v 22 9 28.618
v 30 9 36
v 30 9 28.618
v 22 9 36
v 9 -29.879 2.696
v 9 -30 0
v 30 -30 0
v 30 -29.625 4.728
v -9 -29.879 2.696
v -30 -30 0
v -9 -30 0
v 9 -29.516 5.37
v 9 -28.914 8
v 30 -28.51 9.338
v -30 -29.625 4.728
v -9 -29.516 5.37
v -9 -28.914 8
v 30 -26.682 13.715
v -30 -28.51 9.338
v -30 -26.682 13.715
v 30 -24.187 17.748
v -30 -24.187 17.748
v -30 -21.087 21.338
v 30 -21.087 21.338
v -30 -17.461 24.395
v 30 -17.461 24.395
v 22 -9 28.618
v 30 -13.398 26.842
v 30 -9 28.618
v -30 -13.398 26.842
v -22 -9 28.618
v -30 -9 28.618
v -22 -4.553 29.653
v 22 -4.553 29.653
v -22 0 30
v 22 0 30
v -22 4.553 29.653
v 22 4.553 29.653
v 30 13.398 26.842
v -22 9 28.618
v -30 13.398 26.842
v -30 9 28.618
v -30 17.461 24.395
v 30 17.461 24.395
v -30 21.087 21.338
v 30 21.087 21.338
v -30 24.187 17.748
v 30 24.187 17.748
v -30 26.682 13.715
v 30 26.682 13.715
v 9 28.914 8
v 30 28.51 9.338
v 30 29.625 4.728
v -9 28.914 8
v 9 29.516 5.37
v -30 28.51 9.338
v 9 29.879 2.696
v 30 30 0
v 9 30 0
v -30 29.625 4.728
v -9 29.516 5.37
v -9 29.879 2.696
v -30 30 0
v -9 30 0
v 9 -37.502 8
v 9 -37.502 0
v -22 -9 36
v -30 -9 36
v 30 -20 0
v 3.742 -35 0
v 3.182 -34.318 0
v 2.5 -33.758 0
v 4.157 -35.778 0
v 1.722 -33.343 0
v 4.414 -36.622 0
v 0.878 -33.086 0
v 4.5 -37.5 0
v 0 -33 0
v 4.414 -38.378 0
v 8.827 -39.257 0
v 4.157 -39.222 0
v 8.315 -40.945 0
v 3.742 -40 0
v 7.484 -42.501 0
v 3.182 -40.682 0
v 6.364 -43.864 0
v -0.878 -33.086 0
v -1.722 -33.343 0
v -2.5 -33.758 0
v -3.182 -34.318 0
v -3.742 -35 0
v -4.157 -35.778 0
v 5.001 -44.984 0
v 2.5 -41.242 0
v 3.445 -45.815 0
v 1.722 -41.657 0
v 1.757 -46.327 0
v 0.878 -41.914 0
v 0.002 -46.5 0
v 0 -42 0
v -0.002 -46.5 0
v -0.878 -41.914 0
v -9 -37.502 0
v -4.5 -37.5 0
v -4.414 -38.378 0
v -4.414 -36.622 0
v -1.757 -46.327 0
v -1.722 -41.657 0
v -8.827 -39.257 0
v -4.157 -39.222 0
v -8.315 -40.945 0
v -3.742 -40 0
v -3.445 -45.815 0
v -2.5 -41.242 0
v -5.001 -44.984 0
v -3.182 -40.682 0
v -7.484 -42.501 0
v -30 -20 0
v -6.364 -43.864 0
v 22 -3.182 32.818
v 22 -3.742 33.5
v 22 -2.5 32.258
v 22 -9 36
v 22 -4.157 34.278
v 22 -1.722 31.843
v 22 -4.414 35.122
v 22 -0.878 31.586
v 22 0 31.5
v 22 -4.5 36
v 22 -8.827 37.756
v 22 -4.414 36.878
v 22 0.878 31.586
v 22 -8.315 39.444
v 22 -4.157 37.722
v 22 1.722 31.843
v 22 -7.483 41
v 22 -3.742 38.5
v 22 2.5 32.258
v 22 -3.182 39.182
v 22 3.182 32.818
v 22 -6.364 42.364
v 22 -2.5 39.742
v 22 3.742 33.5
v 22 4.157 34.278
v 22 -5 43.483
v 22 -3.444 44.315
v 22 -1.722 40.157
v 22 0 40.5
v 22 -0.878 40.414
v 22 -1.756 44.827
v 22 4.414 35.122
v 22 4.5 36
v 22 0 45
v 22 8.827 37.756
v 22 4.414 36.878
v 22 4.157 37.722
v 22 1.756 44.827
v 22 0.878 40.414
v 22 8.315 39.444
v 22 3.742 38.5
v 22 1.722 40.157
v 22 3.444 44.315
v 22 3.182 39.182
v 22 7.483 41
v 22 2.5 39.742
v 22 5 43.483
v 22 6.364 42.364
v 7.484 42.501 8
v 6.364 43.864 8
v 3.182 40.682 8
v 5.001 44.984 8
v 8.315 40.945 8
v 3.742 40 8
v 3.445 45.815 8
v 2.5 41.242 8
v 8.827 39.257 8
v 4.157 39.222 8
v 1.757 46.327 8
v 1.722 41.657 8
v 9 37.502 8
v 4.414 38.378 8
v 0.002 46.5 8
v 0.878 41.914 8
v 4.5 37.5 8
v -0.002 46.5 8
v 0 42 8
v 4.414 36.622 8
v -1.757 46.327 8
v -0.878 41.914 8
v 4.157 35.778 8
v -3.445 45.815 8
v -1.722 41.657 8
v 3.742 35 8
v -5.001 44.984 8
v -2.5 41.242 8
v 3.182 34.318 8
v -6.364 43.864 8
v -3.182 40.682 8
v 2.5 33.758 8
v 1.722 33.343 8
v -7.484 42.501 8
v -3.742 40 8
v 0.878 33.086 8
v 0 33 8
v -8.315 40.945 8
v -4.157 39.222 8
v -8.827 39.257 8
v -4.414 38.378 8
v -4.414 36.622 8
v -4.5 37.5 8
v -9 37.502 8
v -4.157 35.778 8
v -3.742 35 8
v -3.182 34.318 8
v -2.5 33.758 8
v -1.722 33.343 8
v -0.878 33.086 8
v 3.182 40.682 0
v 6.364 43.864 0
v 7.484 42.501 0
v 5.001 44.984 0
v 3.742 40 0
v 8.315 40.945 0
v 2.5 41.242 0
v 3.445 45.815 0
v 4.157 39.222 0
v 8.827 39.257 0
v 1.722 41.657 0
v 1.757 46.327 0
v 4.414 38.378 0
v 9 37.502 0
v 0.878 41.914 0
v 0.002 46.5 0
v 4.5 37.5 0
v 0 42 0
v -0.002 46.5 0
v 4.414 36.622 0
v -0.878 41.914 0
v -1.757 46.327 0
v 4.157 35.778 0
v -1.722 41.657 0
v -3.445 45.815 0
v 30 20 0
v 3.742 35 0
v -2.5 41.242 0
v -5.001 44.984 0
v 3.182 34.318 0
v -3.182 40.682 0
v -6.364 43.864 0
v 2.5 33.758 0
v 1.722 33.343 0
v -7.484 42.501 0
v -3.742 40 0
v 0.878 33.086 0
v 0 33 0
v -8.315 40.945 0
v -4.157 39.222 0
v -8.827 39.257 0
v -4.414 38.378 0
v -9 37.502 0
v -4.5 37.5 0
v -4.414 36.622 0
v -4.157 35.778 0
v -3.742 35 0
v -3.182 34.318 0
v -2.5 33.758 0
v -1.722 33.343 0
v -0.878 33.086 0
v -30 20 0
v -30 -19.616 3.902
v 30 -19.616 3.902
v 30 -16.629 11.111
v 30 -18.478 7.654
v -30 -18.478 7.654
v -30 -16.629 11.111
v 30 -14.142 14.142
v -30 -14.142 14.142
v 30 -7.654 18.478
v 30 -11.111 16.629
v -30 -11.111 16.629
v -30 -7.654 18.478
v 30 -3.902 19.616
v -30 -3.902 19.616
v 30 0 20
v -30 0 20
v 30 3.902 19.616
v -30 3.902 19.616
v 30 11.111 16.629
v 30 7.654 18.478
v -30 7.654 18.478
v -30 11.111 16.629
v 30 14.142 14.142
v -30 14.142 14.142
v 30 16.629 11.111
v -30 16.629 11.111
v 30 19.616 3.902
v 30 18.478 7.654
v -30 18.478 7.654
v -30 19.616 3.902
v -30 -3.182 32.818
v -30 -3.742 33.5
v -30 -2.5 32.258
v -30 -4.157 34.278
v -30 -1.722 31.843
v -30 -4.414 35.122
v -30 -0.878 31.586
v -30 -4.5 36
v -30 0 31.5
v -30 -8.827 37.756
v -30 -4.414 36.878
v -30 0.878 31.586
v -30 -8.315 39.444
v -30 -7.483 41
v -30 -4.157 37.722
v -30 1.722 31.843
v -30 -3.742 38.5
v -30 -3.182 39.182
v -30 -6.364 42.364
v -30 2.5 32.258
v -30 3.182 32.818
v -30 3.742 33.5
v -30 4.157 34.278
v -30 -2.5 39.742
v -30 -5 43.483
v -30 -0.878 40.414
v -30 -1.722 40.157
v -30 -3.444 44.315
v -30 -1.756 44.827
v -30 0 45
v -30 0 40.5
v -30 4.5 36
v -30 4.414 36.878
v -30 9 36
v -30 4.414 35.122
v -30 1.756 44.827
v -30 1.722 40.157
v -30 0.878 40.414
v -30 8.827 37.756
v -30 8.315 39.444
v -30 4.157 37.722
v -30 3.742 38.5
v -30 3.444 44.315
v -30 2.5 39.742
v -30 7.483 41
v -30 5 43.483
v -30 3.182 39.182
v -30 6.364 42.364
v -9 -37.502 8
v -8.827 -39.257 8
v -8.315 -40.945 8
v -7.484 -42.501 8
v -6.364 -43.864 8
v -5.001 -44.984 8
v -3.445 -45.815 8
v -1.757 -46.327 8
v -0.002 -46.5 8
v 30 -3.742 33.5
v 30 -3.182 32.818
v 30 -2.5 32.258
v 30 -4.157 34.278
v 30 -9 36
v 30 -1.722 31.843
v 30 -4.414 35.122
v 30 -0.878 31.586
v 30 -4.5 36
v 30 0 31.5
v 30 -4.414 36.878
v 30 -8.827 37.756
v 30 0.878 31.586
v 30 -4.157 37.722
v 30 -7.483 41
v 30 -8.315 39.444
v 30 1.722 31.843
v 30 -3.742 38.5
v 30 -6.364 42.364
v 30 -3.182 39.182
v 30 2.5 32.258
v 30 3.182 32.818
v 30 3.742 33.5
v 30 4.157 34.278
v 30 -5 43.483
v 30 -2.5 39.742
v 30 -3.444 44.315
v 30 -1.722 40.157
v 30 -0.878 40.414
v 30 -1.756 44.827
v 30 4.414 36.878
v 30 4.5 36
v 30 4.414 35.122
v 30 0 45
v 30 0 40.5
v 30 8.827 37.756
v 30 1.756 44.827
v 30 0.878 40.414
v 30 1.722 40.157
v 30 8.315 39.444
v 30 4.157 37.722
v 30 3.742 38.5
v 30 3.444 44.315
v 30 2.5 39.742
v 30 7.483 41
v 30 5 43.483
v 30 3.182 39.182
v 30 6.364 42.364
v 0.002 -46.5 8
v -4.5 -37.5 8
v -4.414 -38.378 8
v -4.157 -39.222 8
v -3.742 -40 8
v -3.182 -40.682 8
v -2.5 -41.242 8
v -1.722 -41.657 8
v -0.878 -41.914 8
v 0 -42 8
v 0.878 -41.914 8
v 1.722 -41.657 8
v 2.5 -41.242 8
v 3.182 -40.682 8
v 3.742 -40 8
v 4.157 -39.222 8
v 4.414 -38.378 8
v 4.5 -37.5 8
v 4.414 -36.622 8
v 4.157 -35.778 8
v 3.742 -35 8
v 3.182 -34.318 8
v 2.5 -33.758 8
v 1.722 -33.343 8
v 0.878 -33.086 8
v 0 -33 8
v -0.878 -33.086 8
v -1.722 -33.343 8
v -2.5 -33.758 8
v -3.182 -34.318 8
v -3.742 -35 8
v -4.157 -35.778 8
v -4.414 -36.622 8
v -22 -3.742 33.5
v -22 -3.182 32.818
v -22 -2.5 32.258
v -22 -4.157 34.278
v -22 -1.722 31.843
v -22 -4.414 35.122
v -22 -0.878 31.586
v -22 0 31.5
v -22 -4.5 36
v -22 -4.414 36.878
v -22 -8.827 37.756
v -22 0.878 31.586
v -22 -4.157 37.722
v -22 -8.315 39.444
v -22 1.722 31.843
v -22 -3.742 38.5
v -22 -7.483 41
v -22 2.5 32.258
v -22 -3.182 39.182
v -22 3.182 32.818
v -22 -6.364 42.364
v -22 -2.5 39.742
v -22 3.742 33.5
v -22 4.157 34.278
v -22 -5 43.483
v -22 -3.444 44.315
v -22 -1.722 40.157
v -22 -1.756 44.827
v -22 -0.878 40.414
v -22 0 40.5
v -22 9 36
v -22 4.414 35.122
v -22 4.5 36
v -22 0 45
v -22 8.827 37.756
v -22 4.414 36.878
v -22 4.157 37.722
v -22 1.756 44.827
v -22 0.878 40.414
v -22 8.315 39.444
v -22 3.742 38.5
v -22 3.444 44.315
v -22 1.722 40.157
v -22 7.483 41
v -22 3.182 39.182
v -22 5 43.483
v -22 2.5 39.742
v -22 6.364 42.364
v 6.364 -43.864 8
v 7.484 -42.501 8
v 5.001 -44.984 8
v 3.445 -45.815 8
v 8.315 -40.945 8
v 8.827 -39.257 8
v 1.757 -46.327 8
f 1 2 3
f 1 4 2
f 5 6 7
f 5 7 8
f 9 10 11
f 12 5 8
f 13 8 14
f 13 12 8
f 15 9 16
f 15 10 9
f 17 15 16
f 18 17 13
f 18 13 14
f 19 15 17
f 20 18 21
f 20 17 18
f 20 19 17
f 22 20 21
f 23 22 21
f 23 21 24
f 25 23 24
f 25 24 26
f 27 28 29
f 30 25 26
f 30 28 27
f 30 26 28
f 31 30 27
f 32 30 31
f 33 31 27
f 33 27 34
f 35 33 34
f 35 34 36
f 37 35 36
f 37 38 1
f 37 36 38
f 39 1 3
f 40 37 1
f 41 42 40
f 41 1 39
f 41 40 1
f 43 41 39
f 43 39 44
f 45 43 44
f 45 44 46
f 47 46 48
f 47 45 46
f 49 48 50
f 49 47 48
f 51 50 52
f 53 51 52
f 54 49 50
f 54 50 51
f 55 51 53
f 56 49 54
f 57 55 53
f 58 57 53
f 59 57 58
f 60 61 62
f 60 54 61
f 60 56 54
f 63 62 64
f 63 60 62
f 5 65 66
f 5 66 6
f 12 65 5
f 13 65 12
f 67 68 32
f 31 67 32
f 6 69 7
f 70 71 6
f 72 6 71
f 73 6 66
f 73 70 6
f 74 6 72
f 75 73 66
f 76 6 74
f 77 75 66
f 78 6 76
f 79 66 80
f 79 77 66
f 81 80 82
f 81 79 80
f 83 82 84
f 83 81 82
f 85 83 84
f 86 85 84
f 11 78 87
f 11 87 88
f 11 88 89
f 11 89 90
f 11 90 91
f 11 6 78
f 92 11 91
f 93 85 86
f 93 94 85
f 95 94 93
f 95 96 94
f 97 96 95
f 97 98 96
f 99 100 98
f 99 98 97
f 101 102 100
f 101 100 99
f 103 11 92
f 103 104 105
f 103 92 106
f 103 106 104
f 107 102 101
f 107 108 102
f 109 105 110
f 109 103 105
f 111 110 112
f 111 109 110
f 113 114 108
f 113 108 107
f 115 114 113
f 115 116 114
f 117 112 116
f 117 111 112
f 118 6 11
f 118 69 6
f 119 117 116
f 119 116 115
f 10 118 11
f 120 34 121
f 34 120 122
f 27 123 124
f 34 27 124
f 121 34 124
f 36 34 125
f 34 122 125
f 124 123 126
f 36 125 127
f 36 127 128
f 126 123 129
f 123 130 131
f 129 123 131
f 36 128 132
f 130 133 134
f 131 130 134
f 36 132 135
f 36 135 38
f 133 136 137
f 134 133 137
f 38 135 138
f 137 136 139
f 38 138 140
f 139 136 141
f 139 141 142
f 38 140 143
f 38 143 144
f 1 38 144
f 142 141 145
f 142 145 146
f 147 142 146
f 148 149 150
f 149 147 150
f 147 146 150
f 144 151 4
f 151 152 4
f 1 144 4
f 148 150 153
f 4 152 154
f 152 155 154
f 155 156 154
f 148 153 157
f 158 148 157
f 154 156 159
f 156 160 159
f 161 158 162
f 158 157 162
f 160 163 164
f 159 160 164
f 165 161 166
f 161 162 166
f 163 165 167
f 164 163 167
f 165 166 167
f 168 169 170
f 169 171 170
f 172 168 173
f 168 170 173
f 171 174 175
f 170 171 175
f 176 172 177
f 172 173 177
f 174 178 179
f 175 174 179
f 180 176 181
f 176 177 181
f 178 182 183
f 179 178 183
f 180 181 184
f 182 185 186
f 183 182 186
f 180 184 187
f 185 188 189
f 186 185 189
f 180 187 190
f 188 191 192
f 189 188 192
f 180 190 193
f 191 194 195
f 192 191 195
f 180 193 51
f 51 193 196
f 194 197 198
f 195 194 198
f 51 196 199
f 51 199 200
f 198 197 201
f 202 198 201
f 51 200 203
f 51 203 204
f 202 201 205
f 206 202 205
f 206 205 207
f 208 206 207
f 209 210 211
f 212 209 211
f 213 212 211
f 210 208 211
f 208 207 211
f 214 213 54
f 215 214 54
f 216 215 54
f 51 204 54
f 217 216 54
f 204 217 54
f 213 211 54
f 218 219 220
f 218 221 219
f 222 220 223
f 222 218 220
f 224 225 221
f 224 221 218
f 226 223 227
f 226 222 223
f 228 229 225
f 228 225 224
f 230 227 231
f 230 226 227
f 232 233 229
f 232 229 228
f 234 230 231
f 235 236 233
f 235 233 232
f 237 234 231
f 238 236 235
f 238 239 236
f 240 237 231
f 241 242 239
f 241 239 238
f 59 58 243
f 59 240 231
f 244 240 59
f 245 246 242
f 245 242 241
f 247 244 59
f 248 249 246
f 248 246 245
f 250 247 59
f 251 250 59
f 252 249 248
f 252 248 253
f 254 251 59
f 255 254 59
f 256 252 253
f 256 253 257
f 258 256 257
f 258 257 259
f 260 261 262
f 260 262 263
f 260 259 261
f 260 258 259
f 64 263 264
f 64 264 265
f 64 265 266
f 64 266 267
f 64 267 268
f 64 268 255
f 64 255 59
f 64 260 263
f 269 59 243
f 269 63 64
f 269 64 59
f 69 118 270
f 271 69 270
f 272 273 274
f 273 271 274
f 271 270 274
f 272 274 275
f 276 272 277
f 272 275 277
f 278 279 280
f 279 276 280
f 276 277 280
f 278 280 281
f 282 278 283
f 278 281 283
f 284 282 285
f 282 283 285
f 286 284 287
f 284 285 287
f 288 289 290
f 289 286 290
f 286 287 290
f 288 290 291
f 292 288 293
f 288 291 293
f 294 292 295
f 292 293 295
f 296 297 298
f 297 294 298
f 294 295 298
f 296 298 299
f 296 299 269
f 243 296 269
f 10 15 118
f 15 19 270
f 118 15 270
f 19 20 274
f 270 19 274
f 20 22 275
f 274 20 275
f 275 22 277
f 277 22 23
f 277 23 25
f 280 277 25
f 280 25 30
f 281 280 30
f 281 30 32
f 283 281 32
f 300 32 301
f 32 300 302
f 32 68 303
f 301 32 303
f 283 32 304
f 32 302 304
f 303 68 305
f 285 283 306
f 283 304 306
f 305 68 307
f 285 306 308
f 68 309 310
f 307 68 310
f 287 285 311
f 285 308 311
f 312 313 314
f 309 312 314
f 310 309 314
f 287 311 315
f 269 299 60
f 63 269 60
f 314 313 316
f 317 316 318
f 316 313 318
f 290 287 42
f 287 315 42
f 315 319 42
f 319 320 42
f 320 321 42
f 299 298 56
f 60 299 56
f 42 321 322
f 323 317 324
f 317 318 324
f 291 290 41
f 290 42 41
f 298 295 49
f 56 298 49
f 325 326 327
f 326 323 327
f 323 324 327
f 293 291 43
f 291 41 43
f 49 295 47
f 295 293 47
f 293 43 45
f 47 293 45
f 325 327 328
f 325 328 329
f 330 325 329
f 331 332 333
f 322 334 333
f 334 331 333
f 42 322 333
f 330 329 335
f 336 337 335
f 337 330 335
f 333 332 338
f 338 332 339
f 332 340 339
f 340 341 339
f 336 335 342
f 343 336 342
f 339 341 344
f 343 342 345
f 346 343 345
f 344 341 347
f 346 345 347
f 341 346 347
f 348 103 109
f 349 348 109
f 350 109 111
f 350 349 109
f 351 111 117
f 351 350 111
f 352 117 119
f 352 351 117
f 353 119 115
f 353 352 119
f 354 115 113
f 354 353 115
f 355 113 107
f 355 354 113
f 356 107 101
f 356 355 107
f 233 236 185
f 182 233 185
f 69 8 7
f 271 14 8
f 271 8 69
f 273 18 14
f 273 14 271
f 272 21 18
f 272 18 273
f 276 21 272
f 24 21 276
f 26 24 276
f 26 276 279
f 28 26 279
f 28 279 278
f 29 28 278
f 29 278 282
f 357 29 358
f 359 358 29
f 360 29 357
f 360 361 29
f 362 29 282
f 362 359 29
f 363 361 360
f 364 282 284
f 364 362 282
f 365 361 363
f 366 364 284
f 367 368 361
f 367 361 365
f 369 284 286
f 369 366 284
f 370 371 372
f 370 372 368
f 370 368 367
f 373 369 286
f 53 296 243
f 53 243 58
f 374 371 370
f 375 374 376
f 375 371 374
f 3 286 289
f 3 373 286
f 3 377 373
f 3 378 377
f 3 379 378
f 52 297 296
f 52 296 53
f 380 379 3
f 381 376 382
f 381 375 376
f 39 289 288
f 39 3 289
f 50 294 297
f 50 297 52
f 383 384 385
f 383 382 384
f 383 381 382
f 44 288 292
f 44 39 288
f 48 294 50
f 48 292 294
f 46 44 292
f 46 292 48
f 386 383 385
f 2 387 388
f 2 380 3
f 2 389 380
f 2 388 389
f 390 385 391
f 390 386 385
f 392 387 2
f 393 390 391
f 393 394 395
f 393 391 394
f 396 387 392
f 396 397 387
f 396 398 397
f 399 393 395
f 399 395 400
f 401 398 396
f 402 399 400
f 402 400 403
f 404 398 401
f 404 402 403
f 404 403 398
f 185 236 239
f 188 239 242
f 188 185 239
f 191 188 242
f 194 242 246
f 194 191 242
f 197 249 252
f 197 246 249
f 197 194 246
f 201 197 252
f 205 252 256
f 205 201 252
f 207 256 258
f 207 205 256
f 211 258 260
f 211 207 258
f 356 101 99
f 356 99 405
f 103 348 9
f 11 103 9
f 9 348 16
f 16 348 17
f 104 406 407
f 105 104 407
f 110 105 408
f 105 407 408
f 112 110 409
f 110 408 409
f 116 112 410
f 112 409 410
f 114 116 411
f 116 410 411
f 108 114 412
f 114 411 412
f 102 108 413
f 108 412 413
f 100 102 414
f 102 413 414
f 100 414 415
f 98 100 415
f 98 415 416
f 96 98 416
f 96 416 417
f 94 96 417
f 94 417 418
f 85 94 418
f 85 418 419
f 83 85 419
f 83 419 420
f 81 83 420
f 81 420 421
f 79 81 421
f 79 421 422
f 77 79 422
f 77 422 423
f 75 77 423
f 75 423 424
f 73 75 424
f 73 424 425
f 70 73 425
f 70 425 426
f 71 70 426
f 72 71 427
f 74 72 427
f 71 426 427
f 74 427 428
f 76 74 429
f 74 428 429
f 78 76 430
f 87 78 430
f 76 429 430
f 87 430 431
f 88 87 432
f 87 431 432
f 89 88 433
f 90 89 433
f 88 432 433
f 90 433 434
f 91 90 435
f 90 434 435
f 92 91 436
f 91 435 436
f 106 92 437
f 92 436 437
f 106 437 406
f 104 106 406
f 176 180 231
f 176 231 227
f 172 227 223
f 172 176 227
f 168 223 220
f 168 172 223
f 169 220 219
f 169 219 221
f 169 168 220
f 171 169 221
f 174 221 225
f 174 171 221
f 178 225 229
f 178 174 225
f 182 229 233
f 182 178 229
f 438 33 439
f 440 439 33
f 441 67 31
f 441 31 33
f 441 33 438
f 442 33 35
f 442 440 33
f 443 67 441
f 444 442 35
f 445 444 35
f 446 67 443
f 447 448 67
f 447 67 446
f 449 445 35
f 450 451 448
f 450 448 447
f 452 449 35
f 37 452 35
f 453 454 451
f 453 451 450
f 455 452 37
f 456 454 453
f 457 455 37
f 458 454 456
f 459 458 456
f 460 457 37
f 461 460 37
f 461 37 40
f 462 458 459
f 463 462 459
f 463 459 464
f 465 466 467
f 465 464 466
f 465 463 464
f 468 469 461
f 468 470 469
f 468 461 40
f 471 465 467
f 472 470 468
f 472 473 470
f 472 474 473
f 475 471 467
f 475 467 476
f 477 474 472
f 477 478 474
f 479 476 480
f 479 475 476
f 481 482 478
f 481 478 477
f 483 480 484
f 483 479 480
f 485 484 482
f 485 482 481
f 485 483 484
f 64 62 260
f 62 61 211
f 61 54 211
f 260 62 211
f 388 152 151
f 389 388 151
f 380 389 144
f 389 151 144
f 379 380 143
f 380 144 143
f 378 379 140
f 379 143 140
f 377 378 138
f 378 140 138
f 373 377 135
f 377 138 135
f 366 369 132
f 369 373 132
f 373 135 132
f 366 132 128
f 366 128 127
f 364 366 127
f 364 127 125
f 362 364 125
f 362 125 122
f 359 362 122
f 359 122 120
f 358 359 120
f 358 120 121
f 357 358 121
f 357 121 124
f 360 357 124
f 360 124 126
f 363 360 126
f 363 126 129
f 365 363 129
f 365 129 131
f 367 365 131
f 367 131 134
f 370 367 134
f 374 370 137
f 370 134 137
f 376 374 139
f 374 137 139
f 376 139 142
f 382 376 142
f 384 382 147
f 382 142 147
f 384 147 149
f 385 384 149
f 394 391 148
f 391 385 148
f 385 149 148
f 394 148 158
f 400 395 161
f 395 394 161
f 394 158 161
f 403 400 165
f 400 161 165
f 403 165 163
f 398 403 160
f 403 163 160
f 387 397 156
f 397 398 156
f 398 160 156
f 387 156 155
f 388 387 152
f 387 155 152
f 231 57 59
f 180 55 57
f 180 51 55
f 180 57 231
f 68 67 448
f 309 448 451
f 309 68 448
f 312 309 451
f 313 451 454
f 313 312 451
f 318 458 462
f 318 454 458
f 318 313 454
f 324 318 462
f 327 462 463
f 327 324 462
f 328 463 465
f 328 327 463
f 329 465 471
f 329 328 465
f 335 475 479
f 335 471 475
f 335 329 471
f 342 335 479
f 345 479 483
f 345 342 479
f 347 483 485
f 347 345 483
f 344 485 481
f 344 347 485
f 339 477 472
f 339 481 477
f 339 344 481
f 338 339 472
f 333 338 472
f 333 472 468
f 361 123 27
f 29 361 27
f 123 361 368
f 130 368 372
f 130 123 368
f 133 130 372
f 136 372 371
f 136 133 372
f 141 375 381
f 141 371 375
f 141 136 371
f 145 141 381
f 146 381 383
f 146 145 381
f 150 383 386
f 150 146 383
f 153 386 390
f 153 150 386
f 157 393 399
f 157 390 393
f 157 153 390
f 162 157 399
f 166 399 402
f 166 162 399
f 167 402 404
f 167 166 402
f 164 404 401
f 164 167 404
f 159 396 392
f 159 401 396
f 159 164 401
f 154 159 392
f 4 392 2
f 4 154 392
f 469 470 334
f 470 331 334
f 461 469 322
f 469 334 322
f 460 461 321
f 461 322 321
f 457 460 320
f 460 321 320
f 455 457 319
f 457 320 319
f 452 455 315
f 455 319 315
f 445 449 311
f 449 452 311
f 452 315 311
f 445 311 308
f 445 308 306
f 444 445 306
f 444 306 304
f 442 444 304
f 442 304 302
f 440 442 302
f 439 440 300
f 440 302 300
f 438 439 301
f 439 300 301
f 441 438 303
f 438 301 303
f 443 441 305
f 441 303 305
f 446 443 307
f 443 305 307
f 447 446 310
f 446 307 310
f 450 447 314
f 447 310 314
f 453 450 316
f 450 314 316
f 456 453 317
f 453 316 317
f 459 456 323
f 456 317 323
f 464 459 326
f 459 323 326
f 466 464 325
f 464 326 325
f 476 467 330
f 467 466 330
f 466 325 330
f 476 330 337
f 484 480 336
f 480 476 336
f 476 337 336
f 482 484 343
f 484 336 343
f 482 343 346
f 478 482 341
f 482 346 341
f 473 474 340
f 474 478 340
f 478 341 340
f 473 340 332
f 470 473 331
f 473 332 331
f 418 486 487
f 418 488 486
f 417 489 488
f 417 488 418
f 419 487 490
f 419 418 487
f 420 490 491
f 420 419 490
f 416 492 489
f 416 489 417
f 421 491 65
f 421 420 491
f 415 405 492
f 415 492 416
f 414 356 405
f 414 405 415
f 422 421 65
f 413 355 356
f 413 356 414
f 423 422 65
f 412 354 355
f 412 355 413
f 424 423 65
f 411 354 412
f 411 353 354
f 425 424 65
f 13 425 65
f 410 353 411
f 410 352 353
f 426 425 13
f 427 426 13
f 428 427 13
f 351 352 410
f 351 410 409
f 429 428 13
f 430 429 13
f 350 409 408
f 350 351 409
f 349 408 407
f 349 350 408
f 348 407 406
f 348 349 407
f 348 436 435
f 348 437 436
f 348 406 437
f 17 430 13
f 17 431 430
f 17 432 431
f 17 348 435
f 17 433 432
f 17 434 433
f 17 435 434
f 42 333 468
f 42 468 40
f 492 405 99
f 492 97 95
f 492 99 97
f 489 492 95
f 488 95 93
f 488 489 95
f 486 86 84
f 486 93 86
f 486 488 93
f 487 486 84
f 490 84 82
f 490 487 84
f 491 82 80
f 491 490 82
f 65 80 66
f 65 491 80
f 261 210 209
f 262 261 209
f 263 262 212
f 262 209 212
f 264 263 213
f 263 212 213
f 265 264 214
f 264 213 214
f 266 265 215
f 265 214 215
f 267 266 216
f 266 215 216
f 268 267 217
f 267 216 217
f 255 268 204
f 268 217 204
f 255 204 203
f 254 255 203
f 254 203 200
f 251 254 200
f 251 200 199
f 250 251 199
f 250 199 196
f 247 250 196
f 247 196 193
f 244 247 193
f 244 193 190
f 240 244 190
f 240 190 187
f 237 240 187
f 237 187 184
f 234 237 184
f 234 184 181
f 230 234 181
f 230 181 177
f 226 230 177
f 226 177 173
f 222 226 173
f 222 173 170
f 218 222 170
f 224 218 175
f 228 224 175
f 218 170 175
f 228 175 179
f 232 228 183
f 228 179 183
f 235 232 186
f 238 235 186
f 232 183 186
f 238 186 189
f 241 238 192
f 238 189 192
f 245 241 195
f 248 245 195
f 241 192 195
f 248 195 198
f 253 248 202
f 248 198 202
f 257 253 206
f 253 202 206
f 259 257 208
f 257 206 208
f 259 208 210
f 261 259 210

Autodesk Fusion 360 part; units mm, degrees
sketch "草图1" plane through (0, 0, 0) normal (1, 0, 0) x (0, 1, 0)
  circle A0 centre (0, 36) radius 4.5
  line L0 (-20, 0) -> (-30, 0)
  line L1 (-30, 0) -> (-46.5, 0)
  line L2 (-46.5, 0) -> (-46.5, 8)
  line L3 (-46.5, 8) -> (-28.9137, 8)
  line L4 (30, 0) -> (46.5, 0)
  line L5 (46.5, 0) -> (46.5, 8)
  line L6 (46.5, 8) -> (28.9137, 8)
  line L7 (30, 0) -> (20, 0)
  arc A1 (30, 0) -> (-30, 0) centre (0, 0) ccw
  arc A2 (20, 0) -> (-20, 0) centre (0, 0) ccw
  line L8 (0, 110) -> (0, -20) construction
  line L9 (-9, 36) -> (-9, 28.6182)
  line L10 (9, 36) -> (9, 28.6182)
  arc A3 (9, 36) -> (-9, 36) centre (0, 36) ccw
  dimension "d1" = 93
  dimension "d2" = 20
  dimension "d3" = 30
  dimension "d4" = 8
  dimension "d5" = 8
  dimension "d6" = 36
  dimension "d7" = 18
  dimension "d8" = 9
extrude "拉伸1" add sketch "草图1" along normal mid plane 18 contours L1 L2 L3 A1 | L4 L5 L6 A1 makes body 1 at (-3, 40.6379, 8) makes body 2 at (-3, -40.6379, 8)
extrude "拉伸2" add sketch "草图1" along normal mid plane 60 contours L0 L7 A1 A2 bodies 1 2
extrude "拉伸3" add sketch "草图1" along normal blind 8 separate body contours A1 L9 L10 A3 makes body 3
move_body "移动1" bodies 3 to x (1, 0, 0) y (0, 1, 0) z (0, 0, 1) at (22, 0, 0)
copy_body "复制和粘贴实体1" bodies 3 makes body 4
move_body "移动2" bodies 4 to x (1, 0, 0) y (0, 1, 0) z (0, 0, 1) at (-52, 0, 0)
fillet "圆角1" radius 9 4 edges at (9, -46.5, 4) (-9, -46.5, 4) (9, 46.5, 4) (-9, 46.5, 4) on bodies 1
sketch "草图2" plane through (0, 0, 8) normal (0, 0, 1) x (-1, 0, 0)
  arc A0 (-9, -37.5) -> (9, -37.5) centre (0, -37.5) ccw
  line L0 (9, -37.5) -> (9, -28.9137)
  line L1 (9, -28.9137) -> (-9, -28.9137)
  line L2 (-9, -28.9137) -> (-9, -37.5)
  circle A1 centre (0, -37.5) radius 4.5
  circle A2 centre (0, 37.5) radius 4.5
  line L3 (55, 0) -> (-41.8167, 0) construction
  dimension "d17" = 9
  dimension "d18" = 75
extrude "拉伸4" cut sketch "草图2" against normal through all contours A1 | A2 bodies 1
combine "合并1" operation add target body 1 tool bodies 4 3
equation "d1 = 75 mm + 18 mm"
